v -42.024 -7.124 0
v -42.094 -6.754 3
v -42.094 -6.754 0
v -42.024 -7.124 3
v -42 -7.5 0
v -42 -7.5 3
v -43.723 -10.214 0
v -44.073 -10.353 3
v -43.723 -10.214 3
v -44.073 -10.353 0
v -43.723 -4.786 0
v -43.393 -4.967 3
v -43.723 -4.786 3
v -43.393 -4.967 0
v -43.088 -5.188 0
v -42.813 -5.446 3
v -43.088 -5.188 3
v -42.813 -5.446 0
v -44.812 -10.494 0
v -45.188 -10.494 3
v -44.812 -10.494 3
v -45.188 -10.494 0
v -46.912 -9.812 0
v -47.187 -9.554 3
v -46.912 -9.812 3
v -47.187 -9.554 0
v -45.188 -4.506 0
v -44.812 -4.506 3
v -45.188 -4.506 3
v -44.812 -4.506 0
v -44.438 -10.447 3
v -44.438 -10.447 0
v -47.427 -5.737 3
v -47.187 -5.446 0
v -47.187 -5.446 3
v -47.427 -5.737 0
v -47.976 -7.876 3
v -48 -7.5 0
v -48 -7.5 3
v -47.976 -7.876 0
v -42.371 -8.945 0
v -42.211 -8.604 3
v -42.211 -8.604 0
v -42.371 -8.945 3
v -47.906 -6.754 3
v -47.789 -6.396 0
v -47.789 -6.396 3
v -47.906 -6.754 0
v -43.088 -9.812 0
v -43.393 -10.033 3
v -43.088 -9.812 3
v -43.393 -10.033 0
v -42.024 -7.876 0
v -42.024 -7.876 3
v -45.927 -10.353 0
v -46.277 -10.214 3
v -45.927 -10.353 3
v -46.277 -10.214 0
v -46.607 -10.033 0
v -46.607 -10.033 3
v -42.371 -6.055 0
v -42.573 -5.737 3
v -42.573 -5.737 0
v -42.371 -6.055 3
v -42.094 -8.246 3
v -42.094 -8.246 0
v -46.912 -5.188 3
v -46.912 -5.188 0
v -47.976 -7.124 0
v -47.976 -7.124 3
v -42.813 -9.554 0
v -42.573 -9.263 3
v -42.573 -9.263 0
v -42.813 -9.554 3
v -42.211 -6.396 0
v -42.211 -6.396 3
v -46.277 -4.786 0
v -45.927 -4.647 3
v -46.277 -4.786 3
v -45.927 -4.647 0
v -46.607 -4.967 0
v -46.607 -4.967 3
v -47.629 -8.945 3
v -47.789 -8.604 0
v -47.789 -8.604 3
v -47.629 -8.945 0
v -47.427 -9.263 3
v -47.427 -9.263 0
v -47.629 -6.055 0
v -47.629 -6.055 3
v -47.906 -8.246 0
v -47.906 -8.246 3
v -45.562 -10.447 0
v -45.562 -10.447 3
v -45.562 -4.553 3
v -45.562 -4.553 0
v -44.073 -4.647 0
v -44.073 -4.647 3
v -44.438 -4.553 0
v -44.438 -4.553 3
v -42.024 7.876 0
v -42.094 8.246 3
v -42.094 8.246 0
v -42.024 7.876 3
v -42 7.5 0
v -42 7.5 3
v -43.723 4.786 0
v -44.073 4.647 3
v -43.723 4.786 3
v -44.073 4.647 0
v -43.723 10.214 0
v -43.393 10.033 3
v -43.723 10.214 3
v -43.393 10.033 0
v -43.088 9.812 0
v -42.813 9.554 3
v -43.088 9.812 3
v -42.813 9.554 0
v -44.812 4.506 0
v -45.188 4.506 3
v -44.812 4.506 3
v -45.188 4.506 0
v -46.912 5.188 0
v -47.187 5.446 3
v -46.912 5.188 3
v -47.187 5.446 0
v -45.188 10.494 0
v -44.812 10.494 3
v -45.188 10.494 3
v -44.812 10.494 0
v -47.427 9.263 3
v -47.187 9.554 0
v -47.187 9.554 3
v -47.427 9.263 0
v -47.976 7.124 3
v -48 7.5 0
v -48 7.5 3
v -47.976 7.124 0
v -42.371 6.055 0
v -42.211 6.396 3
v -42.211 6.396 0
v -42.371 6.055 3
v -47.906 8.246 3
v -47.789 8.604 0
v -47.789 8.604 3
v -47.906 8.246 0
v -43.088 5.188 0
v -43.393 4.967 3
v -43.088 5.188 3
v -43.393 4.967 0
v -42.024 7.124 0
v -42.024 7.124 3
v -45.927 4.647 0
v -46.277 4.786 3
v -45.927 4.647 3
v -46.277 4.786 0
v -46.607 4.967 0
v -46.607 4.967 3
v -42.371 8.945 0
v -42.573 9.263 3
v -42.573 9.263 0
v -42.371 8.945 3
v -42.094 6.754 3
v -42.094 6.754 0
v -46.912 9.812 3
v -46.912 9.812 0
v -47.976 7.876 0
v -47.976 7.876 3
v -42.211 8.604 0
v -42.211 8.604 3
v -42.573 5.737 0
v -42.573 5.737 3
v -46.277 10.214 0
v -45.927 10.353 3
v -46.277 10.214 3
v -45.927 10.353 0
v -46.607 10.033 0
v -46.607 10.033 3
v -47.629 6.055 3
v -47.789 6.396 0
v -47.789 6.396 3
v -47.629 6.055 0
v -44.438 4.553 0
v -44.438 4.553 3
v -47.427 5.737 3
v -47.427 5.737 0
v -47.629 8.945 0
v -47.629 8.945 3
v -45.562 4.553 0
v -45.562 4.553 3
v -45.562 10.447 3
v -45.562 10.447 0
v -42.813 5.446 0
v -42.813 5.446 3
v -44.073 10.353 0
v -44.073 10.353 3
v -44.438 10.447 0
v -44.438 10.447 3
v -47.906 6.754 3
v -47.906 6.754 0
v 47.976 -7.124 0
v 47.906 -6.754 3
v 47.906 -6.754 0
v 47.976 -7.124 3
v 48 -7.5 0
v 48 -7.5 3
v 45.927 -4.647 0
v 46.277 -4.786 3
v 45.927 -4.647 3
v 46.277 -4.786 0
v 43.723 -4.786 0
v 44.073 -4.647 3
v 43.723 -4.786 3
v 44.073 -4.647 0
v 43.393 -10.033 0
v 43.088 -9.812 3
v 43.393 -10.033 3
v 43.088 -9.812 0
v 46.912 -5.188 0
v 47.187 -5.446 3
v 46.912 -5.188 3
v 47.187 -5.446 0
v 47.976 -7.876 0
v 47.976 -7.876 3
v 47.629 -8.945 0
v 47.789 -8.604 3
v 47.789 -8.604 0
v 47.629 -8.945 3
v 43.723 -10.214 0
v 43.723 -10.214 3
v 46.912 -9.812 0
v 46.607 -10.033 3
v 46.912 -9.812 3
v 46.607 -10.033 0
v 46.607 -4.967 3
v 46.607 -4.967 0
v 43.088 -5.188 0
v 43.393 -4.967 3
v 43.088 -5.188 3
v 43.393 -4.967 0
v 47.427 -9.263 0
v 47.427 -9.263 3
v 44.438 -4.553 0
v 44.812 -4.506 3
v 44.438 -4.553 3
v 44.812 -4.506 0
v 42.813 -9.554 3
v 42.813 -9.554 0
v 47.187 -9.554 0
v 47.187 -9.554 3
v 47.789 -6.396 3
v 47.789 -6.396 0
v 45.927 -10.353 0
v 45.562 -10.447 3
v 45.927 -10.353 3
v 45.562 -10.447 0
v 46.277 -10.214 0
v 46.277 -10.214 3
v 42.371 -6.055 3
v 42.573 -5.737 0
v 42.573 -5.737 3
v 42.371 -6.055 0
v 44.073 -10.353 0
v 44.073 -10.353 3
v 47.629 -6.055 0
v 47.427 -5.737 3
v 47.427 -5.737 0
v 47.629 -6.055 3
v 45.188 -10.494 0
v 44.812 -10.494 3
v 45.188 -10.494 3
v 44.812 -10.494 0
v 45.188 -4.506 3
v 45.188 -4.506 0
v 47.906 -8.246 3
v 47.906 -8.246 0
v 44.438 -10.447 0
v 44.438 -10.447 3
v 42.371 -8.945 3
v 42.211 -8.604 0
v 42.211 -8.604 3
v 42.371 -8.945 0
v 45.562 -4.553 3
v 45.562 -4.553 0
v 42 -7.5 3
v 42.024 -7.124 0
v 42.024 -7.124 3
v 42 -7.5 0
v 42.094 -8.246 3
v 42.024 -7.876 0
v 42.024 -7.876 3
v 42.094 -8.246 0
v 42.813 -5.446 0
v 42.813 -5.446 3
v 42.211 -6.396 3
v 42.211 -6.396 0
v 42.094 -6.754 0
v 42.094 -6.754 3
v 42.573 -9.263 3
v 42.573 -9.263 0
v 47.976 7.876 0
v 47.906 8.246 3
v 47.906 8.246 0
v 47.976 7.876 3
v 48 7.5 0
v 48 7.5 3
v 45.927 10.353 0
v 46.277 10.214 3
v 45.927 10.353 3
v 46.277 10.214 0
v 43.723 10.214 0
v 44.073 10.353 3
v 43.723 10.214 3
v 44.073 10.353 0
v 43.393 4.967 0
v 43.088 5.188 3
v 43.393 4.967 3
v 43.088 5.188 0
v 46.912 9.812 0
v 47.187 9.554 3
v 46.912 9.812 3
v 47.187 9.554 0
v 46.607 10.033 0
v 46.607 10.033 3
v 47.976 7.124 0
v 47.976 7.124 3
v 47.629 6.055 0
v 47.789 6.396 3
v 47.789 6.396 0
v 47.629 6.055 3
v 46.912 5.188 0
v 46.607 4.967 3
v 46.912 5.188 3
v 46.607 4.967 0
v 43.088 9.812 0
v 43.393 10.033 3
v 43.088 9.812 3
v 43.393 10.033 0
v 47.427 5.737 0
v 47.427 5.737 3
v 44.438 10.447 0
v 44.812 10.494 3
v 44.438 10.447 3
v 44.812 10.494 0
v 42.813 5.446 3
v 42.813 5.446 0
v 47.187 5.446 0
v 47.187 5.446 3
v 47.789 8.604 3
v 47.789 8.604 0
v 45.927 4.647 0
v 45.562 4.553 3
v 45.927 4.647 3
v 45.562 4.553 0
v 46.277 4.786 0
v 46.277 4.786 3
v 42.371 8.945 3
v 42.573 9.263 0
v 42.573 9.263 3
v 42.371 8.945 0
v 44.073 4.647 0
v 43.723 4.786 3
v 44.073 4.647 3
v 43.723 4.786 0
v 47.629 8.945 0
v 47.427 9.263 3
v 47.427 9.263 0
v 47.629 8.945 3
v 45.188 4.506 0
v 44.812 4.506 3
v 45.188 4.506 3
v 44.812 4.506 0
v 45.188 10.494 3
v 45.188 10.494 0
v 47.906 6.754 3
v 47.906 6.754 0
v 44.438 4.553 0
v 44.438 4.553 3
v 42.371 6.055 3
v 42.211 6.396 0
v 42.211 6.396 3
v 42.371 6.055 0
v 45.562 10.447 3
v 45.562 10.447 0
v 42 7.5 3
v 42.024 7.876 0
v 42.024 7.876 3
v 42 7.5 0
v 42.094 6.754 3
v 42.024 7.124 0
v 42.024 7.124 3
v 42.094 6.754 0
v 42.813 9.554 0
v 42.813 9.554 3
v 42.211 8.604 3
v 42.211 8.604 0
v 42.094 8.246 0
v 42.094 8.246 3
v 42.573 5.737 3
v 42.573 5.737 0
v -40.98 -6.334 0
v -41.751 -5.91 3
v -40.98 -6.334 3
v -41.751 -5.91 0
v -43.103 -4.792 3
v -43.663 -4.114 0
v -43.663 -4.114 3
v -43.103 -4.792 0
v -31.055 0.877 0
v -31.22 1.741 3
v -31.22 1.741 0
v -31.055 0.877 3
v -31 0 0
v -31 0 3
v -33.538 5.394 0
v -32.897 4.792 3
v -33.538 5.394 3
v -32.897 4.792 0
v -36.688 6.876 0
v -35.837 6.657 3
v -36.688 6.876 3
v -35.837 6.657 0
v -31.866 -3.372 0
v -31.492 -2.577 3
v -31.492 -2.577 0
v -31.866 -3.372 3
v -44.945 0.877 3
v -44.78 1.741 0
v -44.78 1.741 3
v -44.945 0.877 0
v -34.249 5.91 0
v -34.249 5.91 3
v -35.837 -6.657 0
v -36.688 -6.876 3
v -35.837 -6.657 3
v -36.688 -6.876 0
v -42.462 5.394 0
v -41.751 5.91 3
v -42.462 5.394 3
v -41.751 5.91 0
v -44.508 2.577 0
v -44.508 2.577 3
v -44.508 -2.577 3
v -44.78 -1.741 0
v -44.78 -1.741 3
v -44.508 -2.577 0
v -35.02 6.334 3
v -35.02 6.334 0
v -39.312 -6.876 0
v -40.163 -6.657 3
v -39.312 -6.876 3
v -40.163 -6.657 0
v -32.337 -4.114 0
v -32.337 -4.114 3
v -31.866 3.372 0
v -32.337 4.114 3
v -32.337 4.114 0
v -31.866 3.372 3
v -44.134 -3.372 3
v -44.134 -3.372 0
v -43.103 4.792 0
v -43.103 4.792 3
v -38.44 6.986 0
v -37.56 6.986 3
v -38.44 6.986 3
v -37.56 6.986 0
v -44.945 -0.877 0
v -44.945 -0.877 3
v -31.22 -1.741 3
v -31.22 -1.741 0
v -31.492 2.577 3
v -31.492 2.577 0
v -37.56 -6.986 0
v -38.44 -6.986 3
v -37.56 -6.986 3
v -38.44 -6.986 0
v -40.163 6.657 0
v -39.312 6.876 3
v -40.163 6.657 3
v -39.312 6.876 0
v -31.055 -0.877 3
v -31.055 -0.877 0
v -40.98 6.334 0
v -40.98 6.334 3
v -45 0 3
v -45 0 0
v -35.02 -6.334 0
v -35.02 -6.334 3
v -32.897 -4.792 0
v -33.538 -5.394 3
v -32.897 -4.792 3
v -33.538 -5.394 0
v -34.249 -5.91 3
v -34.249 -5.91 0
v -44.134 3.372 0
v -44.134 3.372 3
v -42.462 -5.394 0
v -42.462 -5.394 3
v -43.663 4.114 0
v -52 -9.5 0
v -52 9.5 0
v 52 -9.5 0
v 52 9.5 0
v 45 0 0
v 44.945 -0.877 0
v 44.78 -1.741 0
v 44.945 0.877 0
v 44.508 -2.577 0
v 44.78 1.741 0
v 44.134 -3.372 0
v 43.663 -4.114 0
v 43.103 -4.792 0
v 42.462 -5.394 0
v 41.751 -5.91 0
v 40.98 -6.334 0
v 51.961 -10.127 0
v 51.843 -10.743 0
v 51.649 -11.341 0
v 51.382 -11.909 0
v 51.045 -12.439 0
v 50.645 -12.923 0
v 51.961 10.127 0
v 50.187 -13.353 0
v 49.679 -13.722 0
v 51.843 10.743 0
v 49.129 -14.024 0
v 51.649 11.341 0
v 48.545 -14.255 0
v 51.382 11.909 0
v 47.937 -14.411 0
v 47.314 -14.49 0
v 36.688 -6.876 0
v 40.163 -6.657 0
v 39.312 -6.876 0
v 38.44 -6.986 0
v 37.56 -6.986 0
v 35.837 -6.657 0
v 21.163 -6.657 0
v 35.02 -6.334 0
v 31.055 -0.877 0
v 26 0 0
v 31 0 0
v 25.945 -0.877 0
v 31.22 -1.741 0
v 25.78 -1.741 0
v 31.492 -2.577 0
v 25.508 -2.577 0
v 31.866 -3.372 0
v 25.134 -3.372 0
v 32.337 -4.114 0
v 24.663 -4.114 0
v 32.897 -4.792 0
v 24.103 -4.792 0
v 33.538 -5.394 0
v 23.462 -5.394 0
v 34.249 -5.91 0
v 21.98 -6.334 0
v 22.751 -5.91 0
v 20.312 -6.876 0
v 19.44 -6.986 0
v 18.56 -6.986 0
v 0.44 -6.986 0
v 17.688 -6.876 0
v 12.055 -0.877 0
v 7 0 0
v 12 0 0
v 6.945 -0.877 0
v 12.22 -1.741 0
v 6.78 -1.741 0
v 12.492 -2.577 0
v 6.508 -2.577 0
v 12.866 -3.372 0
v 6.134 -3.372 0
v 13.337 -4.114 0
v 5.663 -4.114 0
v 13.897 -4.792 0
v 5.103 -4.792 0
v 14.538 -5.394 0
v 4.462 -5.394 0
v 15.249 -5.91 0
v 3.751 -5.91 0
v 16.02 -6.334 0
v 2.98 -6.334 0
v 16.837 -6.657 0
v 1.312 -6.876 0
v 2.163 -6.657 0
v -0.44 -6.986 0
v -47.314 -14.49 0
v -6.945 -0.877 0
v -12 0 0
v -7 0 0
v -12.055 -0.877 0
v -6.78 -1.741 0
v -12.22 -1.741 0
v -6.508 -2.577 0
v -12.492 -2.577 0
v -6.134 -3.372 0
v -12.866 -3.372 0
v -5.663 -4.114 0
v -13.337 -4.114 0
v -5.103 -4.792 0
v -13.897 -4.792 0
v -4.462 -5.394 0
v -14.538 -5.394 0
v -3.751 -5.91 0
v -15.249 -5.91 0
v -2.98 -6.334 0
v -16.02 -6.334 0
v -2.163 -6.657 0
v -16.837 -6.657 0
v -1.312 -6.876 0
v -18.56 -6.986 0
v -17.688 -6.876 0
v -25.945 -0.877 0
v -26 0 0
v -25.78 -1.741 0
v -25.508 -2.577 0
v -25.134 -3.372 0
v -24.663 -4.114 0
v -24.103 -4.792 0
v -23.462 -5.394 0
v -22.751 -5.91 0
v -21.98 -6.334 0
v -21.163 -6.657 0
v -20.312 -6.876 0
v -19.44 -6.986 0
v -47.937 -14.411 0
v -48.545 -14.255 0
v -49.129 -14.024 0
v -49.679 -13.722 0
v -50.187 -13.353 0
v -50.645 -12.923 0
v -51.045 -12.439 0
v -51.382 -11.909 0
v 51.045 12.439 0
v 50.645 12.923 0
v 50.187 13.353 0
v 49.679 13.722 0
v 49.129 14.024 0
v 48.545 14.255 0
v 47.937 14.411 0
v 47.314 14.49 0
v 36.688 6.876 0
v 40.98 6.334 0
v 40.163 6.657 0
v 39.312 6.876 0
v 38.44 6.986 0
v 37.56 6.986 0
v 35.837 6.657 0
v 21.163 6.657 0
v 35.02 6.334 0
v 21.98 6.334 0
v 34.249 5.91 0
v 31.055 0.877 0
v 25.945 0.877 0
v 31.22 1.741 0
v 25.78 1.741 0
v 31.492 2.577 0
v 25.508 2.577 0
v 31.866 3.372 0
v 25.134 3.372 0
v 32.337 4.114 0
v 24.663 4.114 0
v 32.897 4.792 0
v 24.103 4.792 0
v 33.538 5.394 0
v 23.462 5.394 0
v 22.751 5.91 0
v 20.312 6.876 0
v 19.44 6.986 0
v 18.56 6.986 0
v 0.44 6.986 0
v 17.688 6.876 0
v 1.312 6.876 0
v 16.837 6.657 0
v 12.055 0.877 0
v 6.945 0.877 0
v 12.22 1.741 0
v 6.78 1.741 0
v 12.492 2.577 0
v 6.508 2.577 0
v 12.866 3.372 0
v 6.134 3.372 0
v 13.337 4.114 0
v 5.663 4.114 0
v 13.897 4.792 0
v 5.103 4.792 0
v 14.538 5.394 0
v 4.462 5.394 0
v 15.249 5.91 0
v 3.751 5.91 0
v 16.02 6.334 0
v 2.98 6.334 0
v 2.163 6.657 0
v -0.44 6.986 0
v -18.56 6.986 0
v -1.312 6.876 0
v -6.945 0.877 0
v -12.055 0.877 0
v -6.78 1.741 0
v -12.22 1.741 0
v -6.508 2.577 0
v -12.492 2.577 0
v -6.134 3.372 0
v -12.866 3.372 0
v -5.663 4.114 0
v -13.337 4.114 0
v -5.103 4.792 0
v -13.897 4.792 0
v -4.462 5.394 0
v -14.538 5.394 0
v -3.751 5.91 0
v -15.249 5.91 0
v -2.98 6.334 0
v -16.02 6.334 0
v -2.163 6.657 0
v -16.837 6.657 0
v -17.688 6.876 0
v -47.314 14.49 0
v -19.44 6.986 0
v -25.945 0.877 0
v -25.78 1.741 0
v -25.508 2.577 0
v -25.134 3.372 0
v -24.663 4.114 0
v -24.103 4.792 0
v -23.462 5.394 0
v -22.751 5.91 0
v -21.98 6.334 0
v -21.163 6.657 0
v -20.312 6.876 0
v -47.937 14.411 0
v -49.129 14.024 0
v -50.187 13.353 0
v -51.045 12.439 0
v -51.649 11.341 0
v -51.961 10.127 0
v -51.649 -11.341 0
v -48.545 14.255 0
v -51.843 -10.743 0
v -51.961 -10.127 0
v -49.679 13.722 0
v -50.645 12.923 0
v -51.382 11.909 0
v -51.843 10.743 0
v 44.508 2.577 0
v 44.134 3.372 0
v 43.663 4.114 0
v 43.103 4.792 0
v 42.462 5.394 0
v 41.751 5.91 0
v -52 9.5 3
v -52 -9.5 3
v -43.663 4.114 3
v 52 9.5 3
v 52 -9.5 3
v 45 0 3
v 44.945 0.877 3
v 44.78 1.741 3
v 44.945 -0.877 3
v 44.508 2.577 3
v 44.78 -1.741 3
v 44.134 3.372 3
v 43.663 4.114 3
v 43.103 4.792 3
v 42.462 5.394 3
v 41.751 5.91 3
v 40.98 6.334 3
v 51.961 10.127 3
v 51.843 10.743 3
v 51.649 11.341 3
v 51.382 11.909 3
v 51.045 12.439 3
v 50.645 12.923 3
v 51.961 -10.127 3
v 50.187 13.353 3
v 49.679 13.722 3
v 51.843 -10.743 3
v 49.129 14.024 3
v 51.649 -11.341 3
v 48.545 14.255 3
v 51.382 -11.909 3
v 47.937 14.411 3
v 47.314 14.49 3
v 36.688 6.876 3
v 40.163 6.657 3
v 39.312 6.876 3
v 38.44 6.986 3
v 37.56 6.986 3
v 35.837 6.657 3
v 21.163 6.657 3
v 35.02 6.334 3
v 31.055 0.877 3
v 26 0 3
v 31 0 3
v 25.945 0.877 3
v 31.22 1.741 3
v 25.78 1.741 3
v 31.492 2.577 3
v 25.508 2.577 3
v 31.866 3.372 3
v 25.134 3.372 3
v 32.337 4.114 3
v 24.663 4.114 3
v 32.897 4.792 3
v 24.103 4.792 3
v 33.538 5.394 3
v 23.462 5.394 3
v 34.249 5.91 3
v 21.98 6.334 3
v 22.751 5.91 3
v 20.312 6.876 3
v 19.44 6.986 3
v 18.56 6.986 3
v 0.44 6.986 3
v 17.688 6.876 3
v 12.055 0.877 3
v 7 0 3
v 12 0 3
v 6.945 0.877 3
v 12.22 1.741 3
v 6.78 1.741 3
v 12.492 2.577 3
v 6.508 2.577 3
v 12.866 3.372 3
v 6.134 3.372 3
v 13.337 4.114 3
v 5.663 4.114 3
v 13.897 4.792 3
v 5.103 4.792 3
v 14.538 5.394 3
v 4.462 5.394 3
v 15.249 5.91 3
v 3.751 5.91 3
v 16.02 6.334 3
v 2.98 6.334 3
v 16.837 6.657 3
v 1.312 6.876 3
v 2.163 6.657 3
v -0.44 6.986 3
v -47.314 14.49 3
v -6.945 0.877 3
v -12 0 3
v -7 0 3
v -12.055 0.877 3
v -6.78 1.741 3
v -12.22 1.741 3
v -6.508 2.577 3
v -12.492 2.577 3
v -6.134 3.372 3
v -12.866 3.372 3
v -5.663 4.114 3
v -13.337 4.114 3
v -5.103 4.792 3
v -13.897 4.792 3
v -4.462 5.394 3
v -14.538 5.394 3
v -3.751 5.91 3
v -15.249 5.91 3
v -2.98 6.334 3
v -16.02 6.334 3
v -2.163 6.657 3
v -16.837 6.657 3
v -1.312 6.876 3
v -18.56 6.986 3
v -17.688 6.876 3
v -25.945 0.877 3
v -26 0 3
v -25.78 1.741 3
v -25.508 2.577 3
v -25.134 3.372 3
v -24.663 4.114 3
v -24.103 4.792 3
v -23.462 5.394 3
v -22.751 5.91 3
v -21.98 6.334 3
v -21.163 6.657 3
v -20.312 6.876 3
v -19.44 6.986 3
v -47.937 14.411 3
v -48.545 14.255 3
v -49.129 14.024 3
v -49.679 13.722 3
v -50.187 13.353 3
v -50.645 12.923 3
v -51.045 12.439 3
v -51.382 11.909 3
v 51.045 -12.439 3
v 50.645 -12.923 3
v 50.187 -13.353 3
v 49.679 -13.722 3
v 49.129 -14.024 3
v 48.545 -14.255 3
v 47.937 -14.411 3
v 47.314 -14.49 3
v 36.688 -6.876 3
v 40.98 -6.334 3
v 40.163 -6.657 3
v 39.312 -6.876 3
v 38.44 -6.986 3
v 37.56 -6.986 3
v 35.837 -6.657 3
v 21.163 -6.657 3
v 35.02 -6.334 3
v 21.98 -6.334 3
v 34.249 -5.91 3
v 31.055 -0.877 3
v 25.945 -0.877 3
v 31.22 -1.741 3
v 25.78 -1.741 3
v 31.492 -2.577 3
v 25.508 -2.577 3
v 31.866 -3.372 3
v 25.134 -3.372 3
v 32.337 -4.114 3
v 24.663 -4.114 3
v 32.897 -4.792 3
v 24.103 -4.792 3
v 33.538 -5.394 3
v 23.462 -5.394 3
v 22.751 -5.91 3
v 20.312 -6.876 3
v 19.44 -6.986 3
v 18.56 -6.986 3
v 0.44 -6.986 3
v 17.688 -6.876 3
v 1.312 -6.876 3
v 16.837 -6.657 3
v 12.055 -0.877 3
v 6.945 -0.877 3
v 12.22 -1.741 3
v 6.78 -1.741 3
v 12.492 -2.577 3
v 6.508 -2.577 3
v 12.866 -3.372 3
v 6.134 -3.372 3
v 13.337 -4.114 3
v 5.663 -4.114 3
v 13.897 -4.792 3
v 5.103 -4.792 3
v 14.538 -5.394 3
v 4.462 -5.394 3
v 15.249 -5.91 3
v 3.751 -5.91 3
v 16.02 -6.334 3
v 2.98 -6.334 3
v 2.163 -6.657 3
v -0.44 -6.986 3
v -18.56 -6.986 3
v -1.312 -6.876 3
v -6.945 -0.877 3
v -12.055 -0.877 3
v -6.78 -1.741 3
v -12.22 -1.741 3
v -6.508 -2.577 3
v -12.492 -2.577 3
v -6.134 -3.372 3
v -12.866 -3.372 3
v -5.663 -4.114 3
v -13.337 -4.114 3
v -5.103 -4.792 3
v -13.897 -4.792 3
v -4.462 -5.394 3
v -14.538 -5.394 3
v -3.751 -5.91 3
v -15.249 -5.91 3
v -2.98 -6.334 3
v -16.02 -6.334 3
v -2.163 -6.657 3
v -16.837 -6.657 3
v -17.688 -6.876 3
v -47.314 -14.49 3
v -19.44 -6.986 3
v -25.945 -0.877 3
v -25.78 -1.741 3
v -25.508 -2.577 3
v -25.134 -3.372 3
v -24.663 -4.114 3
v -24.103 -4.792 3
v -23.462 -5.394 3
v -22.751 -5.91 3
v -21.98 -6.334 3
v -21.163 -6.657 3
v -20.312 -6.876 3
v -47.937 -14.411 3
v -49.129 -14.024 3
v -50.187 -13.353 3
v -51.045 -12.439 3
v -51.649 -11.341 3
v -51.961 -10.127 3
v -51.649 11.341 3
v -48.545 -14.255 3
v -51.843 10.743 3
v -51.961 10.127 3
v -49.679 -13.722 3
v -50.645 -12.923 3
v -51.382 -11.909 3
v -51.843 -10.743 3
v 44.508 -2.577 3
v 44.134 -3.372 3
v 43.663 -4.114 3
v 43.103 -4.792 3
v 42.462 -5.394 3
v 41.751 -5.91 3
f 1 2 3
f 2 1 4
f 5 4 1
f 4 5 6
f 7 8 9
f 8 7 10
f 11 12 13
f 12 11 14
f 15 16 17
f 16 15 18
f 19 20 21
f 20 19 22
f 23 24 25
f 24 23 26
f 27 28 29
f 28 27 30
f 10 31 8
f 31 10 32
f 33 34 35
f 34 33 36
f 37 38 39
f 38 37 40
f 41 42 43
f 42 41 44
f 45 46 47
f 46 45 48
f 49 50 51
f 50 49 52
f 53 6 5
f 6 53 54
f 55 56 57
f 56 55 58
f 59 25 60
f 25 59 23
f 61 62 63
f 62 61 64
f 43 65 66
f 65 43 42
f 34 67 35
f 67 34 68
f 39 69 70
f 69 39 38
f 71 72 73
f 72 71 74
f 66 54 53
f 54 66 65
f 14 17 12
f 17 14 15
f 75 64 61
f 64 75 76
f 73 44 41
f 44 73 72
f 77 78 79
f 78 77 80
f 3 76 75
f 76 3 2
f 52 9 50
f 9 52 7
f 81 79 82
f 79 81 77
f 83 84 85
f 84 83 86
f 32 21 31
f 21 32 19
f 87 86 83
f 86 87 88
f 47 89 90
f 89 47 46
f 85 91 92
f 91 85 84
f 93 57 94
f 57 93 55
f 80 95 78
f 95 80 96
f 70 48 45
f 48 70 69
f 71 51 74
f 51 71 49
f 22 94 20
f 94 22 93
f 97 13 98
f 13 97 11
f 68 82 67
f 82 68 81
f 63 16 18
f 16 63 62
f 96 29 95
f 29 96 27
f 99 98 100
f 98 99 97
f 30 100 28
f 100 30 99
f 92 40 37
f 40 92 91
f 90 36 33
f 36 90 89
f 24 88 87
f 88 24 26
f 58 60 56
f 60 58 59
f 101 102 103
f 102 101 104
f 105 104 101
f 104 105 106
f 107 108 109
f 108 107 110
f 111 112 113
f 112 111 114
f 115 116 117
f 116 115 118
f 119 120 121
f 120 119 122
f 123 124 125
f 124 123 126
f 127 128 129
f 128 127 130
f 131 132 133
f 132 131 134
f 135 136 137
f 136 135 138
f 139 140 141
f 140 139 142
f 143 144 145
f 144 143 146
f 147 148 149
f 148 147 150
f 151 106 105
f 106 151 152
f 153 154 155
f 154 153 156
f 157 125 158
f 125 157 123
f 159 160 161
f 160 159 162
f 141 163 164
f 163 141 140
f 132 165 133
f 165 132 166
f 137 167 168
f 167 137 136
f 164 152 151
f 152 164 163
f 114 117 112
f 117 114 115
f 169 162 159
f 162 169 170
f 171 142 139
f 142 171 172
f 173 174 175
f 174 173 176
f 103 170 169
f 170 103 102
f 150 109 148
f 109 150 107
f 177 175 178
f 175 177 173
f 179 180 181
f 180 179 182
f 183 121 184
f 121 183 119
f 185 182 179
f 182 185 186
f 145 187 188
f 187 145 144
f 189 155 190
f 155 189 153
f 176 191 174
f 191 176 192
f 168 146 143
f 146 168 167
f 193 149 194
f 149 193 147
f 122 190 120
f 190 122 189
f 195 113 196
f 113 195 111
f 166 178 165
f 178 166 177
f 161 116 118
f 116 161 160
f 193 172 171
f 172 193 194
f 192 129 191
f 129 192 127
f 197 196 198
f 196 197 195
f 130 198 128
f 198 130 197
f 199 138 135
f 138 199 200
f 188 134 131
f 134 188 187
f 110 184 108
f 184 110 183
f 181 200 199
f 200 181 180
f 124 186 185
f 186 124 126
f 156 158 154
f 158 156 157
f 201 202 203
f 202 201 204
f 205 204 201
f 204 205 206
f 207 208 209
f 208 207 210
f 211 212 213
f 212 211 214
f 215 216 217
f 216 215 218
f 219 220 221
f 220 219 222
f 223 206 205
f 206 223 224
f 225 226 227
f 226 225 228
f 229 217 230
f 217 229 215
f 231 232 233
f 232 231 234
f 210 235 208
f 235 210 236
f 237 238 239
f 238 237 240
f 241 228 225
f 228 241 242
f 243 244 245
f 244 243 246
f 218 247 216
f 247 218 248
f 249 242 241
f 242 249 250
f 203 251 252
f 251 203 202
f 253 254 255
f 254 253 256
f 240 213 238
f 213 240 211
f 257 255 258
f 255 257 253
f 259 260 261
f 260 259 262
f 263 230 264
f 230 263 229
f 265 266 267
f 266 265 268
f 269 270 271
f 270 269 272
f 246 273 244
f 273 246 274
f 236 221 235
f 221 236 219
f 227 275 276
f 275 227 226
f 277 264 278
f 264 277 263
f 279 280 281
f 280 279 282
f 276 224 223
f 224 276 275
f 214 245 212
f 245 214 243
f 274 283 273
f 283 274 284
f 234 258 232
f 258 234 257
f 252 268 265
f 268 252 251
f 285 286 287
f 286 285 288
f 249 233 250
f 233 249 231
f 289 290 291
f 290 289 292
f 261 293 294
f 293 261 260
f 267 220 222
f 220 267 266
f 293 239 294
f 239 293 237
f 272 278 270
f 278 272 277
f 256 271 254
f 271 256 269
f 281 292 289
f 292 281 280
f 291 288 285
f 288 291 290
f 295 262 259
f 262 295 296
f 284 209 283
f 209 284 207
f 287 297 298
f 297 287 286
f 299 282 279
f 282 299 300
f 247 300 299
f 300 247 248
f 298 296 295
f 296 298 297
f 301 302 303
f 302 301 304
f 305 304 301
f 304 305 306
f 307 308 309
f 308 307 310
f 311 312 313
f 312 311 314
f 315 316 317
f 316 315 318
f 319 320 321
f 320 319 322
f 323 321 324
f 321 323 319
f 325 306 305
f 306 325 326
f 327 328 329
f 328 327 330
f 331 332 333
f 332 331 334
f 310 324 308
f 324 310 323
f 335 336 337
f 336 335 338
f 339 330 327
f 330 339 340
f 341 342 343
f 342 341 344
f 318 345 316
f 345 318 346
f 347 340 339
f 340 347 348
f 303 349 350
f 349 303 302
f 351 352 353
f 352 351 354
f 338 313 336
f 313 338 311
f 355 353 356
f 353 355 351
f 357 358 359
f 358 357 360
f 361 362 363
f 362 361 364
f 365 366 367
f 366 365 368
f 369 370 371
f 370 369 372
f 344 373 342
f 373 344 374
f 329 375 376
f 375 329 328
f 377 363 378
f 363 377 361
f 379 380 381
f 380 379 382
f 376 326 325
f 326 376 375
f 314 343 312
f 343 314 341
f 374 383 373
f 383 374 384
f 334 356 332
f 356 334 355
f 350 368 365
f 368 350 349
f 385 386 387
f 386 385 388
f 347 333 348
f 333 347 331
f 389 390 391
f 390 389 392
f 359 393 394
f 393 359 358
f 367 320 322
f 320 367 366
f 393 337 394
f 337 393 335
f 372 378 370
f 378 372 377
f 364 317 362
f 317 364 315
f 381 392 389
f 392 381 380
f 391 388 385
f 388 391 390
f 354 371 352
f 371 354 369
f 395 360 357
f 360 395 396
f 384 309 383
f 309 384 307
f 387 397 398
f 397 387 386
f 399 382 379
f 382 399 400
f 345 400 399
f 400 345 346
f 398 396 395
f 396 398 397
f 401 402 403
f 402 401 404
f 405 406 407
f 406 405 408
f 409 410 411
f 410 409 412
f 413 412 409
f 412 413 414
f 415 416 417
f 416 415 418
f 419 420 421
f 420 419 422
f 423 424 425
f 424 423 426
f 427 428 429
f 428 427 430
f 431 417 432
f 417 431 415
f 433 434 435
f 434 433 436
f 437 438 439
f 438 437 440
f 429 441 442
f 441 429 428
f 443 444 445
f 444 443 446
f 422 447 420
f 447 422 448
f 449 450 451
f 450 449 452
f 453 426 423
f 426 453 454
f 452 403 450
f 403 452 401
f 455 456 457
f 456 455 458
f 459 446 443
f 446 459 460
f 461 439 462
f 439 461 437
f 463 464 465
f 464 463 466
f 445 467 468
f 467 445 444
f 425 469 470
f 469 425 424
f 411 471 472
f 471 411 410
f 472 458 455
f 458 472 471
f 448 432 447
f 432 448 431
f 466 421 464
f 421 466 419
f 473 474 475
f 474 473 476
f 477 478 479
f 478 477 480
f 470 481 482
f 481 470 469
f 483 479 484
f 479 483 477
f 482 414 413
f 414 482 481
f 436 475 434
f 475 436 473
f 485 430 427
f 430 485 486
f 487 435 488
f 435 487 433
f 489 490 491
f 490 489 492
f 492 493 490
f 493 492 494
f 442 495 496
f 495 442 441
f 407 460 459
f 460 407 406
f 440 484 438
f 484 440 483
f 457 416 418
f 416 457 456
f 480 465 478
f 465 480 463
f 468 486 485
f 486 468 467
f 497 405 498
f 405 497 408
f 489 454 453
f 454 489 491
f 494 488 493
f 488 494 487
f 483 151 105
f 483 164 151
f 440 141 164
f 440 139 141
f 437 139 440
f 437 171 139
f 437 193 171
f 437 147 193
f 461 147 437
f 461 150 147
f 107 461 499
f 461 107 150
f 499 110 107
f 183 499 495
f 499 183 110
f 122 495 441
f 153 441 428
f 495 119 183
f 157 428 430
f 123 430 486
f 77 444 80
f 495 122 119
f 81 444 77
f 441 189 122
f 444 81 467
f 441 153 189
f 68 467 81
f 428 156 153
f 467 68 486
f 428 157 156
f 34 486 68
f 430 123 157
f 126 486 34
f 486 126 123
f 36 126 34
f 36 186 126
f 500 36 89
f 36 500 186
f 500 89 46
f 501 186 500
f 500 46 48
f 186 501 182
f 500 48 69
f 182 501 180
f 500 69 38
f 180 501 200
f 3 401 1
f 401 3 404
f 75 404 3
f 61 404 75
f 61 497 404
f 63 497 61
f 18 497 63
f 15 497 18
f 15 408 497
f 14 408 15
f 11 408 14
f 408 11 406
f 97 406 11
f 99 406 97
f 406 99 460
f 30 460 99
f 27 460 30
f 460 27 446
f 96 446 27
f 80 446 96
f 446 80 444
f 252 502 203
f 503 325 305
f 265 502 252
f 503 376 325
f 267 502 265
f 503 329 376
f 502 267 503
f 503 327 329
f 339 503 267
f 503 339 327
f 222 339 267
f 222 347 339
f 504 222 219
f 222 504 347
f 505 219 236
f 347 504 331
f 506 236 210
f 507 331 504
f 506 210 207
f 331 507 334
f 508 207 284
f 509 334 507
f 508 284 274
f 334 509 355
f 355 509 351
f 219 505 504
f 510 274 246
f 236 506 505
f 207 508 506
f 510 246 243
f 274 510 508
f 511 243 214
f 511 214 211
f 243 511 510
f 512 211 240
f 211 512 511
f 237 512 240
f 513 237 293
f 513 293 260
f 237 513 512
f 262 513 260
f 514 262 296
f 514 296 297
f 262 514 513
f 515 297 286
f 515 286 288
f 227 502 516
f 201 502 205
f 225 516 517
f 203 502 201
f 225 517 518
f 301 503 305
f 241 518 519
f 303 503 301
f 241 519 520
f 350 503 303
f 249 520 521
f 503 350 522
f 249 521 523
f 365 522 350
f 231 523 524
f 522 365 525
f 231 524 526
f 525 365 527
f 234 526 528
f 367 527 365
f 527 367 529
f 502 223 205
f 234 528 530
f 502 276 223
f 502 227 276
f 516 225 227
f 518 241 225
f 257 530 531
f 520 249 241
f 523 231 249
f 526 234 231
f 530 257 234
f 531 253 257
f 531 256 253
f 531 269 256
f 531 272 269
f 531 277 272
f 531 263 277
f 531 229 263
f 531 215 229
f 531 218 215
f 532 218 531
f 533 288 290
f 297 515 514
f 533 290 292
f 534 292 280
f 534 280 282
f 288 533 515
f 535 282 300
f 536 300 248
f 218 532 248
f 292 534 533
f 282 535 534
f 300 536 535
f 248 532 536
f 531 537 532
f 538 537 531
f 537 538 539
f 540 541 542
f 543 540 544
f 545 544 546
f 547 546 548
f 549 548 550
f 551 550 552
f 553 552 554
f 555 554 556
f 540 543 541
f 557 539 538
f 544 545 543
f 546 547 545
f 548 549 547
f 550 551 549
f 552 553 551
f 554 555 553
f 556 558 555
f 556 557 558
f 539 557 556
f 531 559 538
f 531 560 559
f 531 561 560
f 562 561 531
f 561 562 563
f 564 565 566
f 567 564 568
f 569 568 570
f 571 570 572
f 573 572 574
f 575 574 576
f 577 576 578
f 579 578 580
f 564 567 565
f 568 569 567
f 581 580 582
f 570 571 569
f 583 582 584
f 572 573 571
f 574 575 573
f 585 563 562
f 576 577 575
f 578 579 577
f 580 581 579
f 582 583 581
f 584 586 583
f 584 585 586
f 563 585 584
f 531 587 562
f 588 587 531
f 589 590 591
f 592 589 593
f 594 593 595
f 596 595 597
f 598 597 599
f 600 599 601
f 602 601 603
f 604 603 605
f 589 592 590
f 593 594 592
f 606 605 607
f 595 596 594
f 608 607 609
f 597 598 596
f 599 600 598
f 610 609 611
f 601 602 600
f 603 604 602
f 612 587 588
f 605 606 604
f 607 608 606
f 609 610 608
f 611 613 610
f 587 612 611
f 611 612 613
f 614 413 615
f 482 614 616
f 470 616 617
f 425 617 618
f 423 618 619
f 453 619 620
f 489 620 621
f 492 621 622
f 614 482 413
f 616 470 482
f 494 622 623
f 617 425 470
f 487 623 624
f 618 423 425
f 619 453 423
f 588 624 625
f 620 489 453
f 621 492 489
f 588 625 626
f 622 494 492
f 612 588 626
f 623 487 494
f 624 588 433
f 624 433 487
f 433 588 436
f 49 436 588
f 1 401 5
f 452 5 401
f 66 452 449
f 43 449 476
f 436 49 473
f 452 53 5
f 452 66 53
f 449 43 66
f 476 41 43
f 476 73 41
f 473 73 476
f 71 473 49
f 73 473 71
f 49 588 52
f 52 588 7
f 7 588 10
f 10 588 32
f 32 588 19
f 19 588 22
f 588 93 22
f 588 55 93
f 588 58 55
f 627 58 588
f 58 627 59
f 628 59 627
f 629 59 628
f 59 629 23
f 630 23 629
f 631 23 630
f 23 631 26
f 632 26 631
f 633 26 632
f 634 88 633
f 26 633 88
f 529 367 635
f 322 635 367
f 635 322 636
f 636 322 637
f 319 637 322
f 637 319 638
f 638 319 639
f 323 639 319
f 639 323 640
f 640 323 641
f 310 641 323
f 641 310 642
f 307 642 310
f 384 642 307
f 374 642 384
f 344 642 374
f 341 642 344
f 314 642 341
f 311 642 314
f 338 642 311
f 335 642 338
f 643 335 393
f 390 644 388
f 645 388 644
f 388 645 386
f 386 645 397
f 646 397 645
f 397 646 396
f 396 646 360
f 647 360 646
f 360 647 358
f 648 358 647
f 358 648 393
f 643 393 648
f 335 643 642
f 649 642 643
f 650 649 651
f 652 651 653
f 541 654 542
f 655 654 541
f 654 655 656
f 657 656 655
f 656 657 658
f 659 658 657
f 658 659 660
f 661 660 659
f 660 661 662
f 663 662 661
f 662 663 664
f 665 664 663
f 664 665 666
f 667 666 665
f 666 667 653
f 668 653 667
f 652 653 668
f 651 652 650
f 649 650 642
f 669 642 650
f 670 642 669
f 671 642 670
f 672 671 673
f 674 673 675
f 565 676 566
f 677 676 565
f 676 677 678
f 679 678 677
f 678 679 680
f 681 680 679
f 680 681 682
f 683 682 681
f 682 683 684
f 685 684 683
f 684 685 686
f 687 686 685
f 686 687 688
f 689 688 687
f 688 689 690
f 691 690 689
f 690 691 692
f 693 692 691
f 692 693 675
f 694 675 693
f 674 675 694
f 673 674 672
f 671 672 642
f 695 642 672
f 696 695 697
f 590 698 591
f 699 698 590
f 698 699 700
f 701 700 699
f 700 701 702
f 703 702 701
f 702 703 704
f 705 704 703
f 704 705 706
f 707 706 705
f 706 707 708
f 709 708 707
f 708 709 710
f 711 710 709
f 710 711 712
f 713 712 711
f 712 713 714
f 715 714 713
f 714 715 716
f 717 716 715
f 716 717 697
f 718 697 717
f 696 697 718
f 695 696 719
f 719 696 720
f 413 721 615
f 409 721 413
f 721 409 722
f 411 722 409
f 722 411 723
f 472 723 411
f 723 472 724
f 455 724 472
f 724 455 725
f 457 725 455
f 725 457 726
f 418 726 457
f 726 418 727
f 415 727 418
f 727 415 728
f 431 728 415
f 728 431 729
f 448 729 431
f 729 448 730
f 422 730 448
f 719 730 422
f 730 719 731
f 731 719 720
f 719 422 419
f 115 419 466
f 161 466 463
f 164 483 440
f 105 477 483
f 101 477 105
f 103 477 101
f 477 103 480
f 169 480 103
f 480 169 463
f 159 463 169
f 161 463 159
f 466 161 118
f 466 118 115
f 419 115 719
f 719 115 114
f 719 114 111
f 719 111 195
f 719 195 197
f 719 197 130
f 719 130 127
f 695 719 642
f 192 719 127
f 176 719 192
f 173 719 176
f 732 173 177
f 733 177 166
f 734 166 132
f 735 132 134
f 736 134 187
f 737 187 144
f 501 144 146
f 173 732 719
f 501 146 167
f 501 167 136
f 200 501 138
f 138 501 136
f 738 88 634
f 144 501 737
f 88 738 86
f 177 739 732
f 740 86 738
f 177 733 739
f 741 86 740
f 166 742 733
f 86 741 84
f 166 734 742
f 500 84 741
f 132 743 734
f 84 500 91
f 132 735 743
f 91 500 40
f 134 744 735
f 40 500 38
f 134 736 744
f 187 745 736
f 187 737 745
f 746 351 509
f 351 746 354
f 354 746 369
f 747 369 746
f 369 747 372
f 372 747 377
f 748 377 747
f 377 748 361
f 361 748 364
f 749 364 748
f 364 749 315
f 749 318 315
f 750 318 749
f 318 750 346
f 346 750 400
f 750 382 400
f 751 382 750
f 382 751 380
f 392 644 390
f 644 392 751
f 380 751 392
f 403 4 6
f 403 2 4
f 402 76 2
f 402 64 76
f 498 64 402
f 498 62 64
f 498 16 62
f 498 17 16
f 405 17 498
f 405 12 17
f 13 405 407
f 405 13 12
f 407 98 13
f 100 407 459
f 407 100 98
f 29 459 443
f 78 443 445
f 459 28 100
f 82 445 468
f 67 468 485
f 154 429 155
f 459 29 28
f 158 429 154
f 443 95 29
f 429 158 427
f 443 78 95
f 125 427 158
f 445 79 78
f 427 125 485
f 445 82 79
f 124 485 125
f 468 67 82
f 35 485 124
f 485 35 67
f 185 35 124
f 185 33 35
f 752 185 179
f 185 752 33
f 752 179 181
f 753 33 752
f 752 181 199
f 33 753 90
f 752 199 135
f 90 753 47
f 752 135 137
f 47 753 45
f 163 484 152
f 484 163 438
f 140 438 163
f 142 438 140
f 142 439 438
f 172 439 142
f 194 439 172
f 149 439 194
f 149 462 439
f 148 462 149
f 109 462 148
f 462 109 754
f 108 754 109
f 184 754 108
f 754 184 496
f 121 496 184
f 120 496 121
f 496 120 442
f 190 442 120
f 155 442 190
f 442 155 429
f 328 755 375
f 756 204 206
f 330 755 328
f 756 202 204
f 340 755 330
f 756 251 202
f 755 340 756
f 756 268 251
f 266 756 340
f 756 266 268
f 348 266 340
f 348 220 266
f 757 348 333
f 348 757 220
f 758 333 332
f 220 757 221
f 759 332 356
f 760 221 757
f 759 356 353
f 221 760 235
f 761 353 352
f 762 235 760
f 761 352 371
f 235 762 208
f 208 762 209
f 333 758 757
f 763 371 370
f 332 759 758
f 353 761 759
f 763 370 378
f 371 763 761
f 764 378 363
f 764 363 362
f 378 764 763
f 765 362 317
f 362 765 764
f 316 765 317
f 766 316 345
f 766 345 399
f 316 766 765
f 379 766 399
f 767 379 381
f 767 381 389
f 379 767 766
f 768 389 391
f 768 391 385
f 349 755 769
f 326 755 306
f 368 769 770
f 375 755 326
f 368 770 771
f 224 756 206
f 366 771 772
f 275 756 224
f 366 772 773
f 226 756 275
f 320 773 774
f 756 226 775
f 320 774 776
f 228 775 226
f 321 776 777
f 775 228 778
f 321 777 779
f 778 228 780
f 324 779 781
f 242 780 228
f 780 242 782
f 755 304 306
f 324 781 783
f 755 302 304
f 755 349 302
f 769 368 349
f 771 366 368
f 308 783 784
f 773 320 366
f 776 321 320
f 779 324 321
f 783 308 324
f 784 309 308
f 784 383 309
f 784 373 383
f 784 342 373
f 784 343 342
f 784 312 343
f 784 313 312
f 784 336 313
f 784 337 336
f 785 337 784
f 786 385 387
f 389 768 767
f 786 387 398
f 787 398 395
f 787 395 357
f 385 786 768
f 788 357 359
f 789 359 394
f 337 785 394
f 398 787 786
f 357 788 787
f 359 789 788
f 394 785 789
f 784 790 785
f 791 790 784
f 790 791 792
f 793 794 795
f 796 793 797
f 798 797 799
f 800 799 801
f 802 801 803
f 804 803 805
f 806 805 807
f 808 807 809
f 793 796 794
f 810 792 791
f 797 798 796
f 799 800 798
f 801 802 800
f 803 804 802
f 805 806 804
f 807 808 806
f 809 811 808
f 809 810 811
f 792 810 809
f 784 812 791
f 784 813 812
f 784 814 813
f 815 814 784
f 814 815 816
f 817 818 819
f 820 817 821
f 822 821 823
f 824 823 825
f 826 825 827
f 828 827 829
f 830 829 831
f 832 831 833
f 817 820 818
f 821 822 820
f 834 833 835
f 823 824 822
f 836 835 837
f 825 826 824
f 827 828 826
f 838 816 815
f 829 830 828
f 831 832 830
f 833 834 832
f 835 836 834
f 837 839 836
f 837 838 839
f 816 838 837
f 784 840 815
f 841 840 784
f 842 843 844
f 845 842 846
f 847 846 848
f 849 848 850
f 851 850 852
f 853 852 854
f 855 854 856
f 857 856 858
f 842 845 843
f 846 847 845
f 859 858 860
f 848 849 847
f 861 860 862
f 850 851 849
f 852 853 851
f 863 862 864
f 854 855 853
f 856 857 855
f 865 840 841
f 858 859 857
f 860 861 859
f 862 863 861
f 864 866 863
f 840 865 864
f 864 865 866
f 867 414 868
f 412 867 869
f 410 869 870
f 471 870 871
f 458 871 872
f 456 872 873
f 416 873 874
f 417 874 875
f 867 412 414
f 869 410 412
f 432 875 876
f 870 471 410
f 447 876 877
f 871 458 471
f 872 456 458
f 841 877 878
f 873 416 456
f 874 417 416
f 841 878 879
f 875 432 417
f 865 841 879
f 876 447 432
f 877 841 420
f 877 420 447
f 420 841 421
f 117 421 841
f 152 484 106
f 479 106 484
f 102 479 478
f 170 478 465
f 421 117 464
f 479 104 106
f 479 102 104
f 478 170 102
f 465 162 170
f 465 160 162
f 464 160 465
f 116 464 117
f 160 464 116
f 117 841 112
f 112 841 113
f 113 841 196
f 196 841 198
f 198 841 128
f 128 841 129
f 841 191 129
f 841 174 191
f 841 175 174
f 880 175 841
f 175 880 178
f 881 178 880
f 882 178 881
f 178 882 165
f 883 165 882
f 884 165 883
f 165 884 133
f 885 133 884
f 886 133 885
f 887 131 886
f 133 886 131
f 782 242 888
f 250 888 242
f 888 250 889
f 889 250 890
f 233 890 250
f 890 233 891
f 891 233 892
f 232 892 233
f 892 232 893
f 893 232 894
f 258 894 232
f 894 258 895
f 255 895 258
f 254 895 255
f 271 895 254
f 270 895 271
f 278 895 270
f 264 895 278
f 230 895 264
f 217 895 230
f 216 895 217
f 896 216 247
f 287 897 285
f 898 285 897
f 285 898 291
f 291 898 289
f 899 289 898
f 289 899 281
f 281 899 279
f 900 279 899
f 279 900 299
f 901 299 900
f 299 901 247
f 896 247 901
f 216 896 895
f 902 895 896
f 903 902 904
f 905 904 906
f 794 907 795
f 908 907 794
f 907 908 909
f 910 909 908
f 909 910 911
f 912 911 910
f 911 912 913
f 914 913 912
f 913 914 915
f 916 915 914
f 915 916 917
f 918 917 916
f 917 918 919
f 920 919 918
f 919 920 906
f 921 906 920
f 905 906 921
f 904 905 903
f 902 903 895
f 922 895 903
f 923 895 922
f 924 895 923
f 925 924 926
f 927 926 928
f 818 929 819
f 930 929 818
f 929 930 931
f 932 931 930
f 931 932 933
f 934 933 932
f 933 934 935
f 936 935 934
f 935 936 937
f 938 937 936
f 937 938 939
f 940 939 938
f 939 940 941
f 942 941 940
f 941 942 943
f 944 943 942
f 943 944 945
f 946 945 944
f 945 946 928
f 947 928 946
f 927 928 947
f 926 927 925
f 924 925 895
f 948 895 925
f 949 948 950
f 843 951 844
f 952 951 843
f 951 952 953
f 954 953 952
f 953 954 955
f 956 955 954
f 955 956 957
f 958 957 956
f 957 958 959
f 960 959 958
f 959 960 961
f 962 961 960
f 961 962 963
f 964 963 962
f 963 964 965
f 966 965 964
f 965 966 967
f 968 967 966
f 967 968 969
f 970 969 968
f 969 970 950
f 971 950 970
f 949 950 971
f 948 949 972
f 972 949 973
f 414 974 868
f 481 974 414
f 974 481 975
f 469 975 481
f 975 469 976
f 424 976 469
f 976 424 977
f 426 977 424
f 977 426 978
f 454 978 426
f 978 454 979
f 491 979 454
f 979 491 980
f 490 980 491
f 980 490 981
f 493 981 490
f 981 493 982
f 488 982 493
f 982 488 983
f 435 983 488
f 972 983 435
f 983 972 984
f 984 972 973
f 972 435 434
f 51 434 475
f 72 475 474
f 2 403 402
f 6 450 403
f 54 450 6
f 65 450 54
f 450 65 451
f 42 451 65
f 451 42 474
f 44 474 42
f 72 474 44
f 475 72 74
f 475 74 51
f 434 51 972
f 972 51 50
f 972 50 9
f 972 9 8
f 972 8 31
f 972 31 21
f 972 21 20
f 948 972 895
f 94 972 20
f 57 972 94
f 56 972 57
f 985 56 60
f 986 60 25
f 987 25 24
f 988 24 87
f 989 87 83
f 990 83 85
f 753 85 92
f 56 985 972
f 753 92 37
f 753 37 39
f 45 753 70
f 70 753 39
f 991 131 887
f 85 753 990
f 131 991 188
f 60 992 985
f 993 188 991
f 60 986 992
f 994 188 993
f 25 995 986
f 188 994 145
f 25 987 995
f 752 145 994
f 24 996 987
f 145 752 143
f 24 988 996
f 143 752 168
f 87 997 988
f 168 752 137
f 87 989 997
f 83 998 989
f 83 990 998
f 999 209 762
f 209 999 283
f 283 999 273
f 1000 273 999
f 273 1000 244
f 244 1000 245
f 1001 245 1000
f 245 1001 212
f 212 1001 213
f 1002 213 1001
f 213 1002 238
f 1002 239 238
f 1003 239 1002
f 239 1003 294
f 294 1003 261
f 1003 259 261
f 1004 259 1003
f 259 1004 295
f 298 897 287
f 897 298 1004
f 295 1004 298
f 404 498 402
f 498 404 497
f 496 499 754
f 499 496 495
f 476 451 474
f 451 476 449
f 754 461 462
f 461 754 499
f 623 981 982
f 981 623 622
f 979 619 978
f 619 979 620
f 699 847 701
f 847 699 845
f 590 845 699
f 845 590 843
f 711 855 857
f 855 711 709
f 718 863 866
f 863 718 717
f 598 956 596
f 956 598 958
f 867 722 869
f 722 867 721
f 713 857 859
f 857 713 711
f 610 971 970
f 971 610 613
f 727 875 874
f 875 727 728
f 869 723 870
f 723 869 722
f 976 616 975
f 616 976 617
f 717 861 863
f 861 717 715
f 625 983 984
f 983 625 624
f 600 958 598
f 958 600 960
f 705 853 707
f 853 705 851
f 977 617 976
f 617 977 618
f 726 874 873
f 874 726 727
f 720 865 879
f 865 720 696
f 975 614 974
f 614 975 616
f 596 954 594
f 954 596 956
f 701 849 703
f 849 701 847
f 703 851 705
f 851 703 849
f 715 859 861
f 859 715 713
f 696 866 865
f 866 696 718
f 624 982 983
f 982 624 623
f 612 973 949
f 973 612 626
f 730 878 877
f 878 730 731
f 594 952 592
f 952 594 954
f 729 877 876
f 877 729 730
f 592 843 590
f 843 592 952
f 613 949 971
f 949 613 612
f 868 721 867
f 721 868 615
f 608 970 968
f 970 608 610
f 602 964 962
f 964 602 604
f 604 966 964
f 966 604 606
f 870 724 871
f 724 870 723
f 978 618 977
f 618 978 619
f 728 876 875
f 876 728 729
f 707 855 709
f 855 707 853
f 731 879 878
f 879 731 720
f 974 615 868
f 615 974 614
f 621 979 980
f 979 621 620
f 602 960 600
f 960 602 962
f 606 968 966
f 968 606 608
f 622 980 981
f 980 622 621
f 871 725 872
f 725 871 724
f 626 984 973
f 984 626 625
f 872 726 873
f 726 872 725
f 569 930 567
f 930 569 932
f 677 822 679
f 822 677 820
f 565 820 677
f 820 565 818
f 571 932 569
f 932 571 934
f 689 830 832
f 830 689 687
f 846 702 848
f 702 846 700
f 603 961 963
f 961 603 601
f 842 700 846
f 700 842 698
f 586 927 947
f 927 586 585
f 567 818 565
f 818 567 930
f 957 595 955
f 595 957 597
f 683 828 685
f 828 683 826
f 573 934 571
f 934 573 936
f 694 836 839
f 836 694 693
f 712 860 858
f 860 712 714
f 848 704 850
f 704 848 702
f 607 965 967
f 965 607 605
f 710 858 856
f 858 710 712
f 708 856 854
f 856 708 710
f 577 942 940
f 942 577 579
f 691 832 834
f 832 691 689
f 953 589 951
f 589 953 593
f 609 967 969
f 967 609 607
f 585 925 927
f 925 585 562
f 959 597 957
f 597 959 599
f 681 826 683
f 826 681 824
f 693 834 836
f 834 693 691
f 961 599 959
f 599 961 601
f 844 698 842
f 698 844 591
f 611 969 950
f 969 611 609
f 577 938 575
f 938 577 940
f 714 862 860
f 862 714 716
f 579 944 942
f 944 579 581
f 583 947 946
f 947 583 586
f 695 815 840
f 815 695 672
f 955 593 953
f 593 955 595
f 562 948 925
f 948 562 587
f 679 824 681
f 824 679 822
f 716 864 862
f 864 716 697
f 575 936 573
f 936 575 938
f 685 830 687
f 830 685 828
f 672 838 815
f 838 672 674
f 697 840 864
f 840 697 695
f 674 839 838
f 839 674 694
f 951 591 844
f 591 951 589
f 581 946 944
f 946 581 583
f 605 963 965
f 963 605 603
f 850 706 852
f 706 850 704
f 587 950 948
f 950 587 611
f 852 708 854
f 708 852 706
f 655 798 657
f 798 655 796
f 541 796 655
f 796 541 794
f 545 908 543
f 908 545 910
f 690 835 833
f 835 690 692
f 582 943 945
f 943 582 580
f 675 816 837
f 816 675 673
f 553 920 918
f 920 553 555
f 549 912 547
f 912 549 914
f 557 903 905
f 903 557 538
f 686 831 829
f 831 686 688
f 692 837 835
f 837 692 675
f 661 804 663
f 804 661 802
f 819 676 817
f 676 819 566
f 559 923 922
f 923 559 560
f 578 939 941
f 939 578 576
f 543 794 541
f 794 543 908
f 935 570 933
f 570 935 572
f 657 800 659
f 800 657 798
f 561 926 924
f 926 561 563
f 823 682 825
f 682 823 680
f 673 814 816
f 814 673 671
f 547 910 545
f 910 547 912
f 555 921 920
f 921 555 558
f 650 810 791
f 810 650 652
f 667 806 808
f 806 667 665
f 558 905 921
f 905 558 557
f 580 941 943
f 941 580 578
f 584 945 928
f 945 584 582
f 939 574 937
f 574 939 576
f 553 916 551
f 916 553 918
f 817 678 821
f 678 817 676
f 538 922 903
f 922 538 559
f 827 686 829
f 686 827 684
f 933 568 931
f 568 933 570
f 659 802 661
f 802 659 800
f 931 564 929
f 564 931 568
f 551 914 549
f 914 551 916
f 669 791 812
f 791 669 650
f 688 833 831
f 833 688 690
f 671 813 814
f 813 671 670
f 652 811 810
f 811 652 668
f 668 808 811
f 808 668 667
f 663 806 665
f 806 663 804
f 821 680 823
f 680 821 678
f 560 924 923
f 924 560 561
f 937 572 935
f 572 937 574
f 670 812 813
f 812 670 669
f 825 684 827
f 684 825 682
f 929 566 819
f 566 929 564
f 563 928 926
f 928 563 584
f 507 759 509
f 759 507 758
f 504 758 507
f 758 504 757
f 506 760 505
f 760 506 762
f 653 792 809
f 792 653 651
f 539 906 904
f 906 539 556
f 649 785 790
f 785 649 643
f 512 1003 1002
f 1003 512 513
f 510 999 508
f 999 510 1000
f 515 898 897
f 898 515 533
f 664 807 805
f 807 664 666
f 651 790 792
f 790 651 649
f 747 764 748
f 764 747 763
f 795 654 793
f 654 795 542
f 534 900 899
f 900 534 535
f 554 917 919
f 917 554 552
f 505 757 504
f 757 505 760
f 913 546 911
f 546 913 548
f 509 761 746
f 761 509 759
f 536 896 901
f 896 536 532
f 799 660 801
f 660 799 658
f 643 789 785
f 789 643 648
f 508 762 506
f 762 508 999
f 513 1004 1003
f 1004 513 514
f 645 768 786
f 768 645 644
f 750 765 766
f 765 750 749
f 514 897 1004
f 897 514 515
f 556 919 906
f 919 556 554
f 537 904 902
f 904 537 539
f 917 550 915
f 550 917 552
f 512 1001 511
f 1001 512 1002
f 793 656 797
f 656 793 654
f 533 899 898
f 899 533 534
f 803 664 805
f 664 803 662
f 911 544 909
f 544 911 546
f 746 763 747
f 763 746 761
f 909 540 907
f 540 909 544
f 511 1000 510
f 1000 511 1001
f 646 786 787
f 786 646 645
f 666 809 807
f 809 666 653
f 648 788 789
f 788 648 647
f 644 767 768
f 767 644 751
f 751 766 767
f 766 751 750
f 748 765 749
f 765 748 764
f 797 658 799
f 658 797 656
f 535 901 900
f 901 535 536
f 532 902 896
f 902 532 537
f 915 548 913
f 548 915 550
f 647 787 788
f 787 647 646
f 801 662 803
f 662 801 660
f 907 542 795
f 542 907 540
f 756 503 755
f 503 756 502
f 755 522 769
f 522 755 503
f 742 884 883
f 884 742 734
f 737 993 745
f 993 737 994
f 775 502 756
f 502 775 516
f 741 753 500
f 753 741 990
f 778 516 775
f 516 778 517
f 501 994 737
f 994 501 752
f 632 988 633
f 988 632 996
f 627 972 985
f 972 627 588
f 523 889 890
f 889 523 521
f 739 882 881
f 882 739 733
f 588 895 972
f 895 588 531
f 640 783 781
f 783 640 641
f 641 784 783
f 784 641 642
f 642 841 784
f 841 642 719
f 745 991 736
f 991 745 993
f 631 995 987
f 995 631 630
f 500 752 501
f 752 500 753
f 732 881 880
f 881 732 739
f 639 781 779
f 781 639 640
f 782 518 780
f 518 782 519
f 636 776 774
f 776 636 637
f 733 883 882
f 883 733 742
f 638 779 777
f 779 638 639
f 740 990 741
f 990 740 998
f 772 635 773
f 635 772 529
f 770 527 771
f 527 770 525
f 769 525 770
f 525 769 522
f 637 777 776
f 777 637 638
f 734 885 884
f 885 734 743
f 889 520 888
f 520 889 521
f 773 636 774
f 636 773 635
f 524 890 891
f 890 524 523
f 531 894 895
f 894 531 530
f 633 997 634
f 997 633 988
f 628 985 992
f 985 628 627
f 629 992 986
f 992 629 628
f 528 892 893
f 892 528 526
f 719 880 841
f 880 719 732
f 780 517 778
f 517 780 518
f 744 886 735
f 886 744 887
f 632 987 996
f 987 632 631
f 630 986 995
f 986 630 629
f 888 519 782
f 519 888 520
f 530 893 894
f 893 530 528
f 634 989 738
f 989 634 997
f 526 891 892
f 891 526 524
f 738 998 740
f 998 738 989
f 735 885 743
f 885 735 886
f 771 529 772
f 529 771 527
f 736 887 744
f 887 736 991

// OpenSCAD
$fn = 50;


difference() {
	union() {
		hull() {
			translate(v = [-47.0000000000, 9.5000000000, 0]) {
				cylinder(h = 3, r = 5);
			}
			translate(v = [47.0000000000, 9.5000000000, 0]) {
				cylinder(h = 3, r = 5);
			}
			translate(v = [-47.0000000000, -9.5000000000, 0]) {
				cylinder(h = 3, r = 5);
			}
			translate(v = [47.0000000000, -9.5000000000, 0]) {
				cylinder(h = 3, r = 5);
			}
		}
	}
	union() {
		#translate(v = [-45.0000000000, -7.5000000000, -100.0000000000]) {
			cylinder(h = 200, r = 3.0000000000);
		}
		#translate(v = [-45.0000000000, 7.5000000000, -100.0000000000]) {
			cylinder(h = 200, r = 3.0000000000);
		}
		#translate(v = [45.0000000000, -7.5000000000, -100.0000000000]) {
			cylinder(h = 200, r = 3.0000000000);
		}
		#translate(v = [45.0000000000, 7.5000000000, -100.0000000000]) {
			cylinder(h = 200, r = 3.0000000000);
		}
		#translate(v = [-38.0000000000, 0, 0]) {
			cylinder(h = 3, r = 7.0000000000);
		}
		#translate(v = [-19.0000000000, 0, 0]) {
			cylinder(h = 3, r = 7.0000000000);
		}
		#cylinder(h = 3, r = 7.0000000000);
		#translate(v = [19.0000000000, 0, 0]) {
			cylinder(h = 3, r = 7.0000000000);
		}
		#translate(v = [38.0000000000, 0, 0]) {
			cylinder(h = 3, r = 7.0000000000);
		}
	}
}
